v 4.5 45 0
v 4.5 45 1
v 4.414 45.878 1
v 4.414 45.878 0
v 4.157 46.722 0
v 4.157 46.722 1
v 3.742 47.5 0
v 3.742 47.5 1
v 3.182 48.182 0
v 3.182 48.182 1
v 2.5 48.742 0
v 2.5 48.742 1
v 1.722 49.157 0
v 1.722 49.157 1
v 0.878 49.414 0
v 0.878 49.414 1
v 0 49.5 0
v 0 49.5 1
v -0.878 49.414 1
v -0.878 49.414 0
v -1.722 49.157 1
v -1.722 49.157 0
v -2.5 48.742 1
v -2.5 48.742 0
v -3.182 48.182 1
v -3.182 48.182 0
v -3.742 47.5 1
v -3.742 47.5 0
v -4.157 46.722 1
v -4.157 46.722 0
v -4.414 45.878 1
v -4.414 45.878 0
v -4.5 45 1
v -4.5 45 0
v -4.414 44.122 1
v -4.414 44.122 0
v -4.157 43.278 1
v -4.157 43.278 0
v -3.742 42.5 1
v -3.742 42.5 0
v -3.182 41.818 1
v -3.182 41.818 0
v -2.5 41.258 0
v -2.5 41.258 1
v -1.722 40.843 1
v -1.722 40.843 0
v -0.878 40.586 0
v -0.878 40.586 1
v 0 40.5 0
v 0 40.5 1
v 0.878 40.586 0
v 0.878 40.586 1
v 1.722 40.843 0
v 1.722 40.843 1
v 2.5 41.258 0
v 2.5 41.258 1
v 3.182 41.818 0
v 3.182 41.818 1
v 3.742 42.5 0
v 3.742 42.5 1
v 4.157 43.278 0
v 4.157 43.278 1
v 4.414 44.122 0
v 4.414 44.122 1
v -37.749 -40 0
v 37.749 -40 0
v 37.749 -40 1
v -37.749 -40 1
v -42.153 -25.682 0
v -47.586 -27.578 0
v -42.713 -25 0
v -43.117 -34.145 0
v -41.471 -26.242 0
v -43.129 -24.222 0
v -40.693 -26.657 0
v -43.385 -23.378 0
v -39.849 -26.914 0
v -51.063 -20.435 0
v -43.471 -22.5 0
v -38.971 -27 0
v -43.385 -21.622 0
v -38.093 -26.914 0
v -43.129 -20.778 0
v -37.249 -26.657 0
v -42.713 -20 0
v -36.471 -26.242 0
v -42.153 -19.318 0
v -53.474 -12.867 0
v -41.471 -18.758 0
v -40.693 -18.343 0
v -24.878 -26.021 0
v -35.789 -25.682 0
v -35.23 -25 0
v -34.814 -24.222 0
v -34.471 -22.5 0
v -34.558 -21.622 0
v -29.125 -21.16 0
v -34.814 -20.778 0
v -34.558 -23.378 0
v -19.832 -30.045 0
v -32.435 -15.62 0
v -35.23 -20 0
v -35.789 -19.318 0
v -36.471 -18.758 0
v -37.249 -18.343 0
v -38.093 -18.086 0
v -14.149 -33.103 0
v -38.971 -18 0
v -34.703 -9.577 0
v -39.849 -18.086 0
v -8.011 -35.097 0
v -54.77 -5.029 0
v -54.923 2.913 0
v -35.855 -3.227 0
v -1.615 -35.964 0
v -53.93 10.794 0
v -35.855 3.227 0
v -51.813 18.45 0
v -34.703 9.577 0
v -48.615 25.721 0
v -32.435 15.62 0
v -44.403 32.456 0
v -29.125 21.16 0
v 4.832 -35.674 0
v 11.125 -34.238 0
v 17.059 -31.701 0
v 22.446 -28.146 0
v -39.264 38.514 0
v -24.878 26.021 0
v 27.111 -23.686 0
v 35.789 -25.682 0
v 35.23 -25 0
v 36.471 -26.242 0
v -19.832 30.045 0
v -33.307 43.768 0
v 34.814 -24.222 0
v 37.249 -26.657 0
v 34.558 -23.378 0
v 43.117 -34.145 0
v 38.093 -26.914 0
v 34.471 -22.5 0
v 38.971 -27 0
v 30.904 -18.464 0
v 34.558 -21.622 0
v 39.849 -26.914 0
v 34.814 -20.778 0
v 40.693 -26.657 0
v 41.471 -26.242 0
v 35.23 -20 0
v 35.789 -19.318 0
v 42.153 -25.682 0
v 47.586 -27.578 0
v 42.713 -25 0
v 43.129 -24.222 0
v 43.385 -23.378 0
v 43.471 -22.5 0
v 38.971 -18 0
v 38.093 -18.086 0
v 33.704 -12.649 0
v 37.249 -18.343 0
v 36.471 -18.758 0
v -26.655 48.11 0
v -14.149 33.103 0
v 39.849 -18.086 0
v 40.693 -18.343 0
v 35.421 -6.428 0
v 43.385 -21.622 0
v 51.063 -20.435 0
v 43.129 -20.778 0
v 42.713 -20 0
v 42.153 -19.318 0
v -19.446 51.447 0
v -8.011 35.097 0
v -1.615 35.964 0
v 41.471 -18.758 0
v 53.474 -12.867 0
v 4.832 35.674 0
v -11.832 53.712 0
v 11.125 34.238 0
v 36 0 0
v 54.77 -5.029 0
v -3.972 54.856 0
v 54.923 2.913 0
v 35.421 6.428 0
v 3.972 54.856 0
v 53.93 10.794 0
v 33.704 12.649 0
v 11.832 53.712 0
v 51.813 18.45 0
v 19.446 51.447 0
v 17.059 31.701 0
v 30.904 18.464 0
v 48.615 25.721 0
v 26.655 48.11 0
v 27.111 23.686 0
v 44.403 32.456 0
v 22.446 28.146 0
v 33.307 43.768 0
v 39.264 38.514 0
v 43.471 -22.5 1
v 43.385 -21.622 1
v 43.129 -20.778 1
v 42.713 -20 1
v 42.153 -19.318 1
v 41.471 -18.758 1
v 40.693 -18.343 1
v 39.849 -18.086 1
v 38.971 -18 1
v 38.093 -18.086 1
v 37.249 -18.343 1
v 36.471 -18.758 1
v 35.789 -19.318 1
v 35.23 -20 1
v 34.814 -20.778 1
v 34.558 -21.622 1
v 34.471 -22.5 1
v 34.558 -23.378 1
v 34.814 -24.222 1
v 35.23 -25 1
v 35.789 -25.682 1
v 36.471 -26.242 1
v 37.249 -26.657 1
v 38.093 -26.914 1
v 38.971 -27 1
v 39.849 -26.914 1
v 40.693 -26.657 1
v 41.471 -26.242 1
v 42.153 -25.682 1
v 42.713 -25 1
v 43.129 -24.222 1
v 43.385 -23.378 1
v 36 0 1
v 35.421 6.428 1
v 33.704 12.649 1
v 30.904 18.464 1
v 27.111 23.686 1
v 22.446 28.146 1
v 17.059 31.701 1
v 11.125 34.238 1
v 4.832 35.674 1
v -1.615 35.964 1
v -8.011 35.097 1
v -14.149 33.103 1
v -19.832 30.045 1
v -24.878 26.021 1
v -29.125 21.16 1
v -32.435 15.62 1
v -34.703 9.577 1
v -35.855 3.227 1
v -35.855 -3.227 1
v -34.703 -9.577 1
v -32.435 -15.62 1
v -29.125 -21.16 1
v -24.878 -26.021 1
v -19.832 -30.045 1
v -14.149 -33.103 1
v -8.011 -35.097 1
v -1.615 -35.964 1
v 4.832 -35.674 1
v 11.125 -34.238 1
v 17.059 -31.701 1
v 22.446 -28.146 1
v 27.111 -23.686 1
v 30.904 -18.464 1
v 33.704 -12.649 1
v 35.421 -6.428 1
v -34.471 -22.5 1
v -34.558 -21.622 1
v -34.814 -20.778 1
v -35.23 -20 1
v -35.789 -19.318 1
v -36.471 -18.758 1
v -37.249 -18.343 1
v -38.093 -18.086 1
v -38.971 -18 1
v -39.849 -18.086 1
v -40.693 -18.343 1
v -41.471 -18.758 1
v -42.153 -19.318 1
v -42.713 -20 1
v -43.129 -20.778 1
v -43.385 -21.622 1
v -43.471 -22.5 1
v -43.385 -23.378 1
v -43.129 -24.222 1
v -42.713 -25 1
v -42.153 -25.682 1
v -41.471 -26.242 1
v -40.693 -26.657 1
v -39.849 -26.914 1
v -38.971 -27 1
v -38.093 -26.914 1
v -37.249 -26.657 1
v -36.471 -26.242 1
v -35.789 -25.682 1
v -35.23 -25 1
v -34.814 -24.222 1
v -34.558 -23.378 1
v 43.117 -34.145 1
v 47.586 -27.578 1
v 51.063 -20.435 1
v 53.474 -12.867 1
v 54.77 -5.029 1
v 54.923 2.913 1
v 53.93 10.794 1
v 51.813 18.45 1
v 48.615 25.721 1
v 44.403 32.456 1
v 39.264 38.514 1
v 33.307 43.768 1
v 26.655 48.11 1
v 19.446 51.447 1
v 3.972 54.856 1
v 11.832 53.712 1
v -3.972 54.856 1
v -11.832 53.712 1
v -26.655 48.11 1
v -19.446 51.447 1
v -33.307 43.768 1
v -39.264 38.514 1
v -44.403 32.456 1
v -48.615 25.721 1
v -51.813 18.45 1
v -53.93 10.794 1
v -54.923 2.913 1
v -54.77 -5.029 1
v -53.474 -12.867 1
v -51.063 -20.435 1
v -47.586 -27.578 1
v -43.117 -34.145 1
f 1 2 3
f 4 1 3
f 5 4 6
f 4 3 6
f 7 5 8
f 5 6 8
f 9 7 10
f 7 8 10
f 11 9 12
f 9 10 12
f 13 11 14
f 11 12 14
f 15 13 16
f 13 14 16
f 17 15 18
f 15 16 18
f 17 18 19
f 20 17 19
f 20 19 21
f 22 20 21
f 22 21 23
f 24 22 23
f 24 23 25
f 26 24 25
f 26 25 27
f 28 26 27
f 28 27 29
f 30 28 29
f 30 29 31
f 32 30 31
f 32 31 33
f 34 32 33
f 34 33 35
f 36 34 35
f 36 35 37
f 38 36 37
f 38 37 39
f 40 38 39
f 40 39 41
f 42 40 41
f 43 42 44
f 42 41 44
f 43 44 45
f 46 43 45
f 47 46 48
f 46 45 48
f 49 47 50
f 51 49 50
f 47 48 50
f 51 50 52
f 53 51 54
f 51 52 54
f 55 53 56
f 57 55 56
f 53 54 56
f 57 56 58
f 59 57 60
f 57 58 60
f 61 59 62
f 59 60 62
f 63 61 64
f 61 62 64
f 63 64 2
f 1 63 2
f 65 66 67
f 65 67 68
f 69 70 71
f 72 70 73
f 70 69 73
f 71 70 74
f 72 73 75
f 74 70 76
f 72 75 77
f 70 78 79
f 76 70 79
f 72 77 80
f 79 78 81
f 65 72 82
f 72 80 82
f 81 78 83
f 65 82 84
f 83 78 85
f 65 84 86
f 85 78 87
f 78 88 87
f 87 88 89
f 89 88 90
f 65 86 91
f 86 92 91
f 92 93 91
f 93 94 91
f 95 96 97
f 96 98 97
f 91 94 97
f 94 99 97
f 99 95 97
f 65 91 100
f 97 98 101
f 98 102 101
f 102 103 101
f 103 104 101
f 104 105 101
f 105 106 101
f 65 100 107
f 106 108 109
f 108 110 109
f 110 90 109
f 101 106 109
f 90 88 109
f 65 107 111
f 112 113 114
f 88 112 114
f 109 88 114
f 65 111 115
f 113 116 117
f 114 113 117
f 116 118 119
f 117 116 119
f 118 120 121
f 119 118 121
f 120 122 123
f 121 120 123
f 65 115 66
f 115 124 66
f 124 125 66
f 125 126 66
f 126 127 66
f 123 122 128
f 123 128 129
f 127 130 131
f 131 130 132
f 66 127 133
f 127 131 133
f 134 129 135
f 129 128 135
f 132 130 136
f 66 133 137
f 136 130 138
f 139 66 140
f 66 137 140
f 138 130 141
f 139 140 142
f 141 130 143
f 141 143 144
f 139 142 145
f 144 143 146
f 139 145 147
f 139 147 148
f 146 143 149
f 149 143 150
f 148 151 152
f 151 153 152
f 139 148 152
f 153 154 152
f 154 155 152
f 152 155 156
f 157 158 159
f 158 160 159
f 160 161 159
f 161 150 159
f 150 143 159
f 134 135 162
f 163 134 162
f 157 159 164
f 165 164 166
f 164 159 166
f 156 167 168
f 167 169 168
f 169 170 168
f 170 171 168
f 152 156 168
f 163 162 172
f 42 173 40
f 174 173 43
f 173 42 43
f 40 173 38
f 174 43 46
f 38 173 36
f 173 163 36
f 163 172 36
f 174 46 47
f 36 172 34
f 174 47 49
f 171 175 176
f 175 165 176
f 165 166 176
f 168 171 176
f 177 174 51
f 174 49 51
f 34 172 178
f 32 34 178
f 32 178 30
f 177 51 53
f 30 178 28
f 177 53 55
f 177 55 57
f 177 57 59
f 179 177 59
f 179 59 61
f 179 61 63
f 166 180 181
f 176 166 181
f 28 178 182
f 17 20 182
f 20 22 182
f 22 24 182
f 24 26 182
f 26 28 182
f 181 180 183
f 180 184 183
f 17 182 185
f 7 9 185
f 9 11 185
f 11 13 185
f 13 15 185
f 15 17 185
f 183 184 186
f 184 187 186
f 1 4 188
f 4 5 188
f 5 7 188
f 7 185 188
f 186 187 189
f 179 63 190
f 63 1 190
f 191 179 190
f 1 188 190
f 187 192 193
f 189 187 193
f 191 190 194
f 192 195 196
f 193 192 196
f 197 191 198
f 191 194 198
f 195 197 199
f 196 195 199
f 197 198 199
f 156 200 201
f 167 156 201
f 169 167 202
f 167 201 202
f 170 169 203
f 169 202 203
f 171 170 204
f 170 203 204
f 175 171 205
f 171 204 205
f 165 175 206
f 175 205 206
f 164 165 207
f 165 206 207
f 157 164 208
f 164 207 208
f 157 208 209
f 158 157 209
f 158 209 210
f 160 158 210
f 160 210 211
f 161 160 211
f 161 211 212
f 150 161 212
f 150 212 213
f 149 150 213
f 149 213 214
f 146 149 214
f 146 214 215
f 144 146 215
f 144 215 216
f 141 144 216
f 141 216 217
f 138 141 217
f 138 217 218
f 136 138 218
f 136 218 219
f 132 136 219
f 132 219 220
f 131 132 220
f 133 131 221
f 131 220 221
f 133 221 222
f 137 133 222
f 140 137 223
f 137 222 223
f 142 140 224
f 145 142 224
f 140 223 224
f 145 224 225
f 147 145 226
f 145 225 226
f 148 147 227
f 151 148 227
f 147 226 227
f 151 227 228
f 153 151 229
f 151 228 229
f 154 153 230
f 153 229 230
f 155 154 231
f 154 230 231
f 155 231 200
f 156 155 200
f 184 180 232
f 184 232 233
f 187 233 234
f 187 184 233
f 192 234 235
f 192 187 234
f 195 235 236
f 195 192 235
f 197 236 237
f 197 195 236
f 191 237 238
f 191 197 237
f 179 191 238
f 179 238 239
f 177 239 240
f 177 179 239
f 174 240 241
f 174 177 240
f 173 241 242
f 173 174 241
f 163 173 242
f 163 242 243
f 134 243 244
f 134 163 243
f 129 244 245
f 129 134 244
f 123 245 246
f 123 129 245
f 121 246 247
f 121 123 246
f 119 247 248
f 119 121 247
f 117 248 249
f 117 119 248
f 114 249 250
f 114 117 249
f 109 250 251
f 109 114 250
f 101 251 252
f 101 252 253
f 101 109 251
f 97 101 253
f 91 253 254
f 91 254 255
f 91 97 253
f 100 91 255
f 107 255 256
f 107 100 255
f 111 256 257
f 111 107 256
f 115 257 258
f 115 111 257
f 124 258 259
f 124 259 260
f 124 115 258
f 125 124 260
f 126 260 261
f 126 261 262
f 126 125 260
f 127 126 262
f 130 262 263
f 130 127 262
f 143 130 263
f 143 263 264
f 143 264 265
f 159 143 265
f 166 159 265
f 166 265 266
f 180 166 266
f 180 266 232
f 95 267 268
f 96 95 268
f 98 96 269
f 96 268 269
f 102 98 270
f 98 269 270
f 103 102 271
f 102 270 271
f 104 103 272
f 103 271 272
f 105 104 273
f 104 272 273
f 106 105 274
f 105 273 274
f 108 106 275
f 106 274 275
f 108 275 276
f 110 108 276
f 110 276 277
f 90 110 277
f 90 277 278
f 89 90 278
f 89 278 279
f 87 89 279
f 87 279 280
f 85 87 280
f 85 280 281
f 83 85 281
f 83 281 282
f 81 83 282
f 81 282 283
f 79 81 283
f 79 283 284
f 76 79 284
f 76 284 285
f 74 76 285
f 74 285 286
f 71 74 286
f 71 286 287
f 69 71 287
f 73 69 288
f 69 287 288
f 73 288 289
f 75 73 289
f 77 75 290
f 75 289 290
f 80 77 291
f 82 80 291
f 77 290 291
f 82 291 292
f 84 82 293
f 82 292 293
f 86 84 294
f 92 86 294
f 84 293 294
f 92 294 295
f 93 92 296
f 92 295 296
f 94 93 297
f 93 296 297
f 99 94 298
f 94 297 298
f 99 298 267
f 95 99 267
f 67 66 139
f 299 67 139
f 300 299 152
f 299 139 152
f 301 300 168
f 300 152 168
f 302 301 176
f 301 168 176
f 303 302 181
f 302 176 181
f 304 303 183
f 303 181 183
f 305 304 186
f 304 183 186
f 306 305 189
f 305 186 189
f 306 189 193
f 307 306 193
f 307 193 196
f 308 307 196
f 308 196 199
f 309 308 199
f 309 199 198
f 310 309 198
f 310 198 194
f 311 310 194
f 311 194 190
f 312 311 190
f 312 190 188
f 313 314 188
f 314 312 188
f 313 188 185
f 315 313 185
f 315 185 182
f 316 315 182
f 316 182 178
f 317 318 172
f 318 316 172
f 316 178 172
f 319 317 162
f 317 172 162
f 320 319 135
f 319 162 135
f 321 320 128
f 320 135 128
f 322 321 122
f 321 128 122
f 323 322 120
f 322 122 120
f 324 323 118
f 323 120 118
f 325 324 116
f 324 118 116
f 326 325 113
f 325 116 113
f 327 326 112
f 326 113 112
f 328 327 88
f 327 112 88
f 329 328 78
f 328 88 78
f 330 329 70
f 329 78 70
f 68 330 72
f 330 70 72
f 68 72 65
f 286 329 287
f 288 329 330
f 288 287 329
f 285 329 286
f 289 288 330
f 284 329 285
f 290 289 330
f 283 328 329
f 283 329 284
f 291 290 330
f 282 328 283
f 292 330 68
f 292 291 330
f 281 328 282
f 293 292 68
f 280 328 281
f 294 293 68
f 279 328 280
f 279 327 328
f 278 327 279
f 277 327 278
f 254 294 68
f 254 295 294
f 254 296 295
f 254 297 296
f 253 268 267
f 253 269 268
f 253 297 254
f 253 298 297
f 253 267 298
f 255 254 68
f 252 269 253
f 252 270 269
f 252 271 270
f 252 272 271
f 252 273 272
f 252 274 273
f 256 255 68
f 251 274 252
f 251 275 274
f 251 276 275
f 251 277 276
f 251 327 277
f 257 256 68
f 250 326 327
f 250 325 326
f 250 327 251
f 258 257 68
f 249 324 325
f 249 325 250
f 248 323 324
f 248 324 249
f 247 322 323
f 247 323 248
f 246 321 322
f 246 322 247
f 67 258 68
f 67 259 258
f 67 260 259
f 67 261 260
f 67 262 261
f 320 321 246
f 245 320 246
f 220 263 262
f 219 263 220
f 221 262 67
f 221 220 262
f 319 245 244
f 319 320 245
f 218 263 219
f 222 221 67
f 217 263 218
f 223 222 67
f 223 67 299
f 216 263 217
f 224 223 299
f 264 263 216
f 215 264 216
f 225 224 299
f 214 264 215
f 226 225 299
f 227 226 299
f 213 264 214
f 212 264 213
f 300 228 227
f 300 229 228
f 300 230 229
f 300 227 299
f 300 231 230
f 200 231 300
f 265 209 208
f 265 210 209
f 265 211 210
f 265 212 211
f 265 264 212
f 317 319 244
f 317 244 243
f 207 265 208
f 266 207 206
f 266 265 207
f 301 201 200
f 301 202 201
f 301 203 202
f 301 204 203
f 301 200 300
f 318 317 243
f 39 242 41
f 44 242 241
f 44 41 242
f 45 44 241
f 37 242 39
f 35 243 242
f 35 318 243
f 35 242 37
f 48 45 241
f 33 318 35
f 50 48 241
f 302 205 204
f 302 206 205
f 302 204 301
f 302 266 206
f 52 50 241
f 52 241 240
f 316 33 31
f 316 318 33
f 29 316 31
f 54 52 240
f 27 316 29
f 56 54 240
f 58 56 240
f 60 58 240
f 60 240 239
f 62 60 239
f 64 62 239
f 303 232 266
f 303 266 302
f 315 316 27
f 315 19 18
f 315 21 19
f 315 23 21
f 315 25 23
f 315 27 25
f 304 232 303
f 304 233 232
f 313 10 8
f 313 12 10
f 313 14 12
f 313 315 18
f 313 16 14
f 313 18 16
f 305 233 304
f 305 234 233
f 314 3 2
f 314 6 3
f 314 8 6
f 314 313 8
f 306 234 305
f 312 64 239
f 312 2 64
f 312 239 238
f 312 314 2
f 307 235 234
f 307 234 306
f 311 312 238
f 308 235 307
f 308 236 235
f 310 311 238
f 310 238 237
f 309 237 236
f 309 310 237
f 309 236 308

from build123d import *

# Parameters (mm, degrees)
SCHIZZO1_R                   = 55
SCHIZZO1_R_2                 = 36
ESTRUSIONE_ESTRUSIONE1_DEPTH = 1
SCHIZZO2_R                   = 4.5
TAGLIO_ESTRUSIONE1_DEPTH     = 78.788173908
SCHIZZO4_OUTSIDE_W           = 143.114
SCHIZZO4_OUTSIDE_H           = 143.114
TAGLIO_ESTRUSIONE2_DEPTH     = 78.788173908


with BuildPart() as part:
    # Schizzo1 → Estrusione-Estrusione1 (new body)
    with BuildSketch(Plane.XY):
        Circle(SCHIZZO1_R)
        Circle(SCHIZZO1_R_2, mode=Mode.SUBTRACT)
    extrude(amount=ESTRUSIONE_ESTRUSIONE1_DEPTH)

    # Schizzo2 → Taglio-Estrusione1 (cut, through all)
    with BuildSketch(Plane.XY.offset(1)):
        with Locations((0, 45)):
            Circle(SCHIZZO2_R)
        with Locations((38.97114317, -22.5)):
            Circle(SCHIZZO2_R)
        with Locations((-38.97114317, -22.5)):
            Circle(SCHIZZO2_R)
    extrude(amount=-TAGLIO_ESTRUSIONE1_DEPTH, mode=Mode.SUBTRACT)

    # Schizzo4 outside → Taglio-Estrusione2 (cut, through all)
    with BuildSketch(Plane.XY):
        Rectangle(SCHIZZO4_OUTSIDE_W, SCHIZZO4_OUTSIDE_H)
        with BuildLine():
            Line((37.749172176, -40), (-37.749172176, -40))
            ThreePointArc((-37.749172176, -40), (0, 55), (37.749172176, -40))
        make_face(mode=Mode.SUBTRACT)
    extrude(amount=TAGLIO_ESTRUSIONE2_DEPTH, mode=Mode.SUBTRACT)


solid = part.part
